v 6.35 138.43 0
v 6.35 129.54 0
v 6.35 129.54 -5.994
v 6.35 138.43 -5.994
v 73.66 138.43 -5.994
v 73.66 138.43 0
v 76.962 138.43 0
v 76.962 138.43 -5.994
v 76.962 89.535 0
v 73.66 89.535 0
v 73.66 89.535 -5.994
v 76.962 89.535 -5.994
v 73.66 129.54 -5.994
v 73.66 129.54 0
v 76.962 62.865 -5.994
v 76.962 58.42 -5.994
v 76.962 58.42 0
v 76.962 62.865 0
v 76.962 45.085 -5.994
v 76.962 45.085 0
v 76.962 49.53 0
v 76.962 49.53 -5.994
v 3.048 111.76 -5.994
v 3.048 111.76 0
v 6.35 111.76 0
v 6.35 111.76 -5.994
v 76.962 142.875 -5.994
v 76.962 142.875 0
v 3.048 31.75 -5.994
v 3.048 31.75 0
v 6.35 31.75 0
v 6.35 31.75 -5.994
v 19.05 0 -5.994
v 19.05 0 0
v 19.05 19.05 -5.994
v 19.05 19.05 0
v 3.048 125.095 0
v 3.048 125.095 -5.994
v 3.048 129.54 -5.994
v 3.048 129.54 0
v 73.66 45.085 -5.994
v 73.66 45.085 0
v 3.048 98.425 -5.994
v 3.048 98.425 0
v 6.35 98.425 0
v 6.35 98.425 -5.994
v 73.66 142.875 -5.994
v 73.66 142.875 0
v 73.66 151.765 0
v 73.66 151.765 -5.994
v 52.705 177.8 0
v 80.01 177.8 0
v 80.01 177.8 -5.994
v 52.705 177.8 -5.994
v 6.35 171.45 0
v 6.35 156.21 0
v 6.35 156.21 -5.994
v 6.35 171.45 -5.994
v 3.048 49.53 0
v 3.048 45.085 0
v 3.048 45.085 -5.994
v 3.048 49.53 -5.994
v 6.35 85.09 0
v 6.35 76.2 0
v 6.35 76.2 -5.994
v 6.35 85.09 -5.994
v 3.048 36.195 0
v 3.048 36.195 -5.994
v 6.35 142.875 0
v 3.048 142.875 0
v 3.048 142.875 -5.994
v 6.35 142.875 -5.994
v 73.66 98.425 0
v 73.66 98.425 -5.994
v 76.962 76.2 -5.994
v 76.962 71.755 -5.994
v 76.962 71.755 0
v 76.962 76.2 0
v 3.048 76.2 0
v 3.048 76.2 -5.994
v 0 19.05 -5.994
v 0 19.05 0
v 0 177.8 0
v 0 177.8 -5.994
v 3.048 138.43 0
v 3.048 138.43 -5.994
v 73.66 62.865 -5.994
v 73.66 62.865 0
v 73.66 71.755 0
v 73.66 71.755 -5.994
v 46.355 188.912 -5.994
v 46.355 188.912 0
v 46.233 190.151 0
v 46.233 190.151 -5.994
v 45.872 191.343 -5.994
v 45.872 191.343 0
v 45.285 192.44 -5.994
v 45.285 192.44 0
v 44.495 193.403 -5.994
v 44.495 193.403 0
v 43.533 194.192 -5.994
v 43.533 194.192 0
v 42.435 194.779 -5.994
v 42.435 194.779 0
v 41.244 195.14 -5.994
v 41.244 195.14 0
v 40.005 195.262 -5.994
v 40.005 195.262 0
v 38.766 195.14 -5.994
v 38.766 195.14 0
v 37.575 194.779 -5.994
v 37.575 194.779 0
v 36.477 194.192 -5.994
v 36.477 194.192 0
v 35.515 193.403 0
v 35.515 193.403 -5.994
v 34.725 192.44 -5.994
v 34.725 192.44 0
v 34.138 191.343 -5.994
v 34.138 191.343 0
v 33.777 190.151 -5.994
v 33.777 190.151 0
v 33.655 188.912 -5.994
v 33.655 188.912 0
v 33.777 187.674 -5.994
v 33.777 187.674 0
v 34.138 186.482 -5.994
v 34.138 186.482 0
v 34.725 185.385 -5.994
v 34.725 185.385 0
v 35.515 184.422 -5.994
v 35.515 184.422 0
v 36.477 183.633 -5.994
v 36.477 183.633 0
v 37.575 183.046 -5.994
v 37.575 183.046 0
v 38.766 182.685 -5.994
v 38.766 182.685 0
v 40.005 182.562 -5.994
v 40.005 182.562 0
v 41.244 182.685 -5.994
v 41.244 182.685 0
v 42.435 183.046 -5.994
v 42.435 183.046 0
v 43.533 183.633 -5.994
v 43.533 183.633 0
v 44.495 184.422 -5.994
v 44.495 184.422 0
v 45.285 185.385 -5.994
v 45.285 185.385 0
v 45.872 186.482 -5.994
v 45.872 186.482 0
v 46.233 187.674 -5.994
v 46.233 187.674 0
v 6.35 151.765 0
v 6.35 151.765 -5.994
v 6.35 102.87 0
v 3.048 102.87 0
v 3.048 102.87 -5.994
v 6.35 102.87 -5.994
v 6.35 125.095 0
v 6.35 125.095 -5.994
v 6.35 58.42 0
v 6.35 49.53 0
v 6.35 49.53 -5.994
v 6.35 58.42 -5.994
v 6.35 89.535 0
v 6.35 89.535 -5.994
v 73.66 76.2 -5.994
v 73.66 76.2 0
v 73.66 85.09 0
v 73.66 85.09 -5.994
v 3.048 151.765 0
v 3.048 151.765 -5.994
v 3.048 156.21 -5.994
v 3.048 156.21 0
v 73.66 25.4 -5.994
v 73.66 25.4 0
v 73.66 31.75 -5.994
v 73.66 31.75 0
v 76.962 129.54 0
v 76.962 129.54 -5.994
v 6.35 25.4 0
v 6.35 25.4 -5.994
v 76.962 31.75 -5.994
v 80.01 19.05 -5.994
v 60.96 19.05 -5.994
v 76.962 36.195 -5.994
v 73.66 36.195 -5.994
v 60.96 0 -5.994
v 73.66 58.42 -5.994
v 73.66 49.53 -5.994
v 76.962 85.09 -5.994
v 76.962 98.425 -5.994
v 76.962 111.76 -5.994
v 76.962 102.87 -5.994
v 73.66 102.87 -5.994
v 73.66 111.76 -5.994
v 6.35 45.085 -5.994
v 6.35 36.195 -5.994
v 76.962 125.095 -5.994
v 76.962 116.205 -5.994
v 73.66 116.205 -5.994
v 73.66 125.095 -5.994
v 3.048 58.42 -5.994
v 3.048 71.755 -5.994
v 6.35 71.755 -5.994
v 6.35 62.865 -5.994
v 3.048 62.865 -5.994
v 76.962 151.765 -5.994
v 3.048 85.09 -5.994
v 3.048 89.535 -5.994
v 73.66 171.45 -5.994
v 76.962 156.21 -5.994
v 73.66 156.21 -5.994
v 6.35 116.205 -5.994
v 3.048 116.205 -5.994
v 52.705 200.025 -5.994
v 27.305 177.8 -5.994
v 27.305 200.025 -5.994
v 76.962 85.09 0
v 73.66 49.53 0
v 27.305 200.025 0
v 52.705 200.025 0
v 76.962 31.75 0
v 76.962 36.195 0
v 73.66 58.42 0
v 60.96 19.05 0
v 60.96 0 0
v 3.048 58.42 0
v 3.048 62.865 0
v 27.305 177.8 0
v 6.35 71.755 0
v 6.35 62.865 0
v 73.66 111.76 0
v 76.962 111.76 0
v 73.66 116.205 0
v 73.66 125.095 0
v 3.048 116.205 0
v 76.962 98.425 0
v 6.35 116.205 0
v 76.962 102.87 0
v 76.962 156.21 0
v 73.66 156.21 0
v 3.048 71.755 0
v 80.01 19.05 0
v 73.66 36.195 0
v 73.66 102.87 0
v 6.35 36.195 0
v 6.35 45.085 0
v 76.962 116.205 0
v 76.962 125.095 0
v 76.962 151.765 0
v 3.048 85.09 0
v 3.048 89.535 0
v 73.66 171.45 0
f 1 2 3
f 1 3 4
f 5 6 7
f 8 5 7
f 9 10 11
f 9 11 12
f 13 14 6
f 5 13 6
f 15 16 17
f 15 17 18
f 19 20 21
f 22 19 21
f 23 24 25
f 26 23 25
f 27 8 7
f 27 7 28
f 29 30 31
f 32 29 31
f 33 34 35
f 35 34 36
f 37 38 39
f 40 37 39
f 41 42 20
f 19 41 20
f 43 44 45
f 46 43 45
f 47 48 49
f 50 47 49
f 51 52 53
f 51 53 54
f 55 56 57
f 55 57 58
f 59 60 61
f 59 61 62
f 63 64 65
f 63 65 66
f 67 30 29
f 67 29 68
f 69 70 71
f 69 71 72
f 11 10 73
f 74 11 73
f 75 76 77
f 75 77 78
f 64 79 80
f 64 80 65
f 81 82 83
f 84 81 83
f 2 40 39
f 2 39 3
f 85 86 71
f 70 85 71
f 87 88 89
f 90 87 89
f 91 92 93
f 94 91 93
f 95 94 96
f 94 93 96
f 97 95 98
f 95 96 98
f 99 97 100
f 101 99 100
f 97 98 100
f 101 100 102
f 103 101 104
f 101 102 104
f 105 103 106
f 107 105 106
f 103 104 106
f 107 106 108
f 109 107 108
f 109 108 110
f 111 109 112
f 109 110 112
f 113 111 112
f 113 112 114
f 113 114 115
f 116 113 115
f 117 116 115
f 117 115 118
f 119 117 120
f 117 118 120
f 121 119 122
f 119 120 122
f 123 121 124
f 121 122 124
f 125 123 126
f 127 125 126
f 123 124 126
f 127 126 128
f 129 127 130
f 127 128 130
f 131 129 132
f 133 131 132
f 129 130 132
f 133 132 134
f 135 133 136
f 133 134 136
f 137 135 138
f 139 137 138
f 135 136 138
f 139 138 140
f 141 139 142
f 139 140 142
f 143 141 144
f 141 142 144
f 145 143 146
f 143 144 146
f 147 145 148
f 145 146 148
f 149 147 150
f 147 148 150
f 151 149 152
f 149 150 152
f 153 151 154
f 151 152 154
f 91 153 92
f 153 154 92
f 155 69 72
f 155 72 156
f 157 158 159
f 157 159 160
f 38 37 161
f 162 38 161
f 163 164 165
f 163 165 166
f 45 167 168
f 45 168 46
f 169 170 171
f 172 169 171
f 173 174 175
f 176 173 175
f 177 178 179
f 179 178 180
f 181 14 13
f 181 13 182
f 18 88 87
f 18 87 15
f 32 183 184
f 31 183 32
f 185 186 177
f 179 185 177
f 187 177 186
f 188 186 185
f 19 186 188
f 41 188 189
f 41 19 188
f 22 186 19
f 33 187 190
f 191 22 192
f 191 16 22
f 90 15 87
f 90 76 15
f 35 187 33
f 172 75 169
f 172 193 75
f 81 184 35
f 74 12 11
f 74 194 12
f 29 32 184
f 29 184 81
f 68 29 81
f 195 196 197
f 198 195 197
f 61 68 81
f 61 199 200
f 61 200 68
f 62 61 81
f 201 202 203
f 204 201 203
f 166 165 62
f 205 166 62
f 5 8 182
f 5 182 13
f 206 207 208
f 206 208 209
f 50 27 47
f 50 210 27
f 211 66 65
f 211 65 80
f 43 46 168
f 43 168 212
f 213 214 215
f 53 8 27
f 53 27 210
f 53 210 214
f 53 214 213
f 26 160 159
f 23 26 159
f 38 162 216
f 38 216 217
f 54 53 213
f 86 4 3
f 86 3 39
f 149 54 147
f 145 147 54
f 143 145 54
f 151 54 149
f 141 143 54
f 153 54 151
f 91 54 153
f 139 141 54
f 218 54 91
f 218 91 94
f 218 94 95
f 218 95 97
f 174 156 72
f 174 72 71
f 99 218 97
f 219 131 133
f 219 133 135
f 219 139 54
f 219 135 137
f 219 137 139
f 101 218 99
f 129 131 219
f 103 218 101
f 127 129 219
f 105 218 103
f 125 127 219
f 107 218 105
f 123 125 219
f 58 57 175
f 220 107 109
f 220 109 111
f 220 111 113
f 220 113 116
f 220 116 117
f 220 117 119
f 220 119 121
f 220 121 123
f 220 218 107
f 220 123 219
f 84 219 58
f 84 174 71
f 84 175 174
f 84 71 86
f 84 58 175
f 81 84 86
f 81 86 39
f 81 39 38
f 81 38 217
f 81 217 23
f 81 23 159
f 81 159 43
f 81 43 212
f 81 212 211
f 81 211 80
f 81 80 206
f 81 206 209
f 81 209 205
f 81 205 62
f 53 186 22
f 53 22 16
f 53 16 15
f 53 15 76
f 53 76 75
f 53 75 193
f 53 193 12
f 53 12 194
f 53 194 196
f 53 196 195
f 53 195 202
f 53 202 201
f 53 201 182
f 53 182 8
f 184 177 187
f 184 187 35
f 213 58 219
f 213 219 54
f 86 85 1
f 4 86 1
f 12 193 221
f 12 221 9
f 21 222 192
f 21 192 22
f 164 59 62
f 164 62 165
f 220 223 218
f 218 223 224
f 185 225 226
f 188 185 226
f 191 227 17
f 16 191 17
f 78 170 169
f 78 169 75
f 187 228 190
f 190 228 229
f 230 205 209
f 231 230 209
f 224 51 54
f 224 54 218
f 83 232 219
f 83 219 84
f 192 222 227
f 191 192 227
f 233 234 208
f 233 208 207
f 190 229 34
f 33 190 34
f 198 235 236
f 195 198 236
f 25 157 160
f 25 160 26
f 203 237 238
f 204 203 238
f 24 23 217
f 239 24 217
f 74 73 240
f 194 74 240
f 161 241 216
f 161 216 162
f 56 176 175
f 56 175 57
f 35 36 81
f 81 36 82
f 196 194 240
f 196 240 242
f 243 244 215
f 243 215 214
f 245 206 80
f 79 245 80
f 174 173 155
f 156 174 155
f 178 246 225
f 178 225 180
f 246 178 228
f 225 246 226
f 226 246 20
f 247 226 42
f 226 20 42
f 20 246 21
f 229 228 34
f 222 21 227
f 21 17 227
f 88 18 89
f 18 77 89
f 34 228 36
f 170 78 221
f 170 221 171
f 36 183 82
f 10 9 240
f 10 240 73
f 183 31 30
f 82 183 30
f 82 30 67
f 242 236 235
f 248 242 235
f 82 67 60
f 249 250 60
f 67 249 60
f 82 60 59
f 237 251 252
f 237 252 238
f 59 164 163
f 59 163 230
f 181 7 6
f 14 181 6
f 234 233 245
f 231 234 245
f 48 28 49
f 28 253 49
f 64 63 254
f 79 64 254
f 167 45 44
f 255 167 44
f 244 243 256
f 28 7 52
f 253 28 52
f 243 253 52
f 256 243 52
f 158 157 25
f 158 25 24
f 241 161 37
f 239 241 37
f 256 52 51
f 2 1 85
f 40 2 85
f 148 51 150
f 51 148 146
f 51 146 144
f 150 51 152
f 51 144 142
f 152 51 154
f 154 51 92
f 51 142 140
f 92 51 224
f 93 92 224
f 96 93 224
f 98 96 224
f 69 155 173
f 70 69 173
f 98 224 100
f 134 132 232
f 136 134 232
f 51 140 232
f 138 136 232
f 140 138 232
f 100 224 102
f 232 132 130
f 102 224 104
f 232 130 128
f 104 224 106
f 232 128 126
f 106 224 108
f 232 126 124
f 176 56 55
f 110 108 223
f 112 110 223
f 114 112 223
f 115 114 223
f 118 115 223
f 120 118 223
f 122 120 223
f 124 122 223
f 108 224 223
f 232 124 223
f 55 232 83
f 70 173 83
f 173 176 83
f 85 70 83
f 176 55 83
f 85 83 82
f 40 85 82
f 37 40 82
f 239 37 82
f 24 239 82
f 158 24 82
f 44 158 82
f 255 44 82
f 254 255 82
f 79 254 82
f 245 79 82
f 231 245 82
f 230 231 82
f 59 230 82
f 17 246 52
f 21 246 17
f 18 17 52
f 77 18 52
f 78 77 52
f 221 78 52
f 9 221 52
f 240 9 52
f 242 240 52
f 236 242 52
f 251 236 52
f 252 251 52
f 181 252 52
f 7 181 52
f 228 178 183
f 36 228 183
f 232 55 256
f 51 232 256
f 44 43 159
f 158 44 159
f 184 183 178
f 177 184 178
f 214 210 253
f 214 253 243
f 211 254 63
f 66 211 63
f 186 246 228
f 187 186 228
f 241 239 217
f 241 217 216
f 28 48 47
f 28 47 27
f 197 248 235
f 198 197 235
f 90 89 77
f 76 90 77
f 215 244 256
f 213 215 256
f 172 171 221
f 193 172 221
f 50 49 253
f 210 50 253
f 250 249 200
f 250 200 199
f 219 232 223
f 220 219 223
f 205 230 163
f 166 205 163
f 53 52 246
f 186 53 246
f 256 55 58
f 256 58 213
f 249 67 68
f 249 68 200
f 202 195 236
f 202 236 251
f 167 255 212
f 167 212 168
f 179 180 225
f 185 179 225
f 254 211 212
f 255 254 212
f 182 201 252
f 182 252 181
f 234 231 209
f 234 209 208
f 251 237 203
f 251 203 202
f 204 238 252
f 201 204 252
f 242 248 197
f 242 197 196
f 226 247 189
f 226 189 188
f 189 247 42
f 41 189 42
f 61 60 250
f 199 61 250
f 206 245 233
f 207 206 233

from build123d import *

# Parameters (mm, degrees)
SKETCH1_W           = 67.31
SKETCH1_H           = 146.05
BOSS_EXTRUDE1_DEPTH = 5.9944
SKETCH2_W           = 6.604
SKETCH2_H           = 4.445
CUT_EXTRUDE1_DEPTH  = 6.9944
SKETCH3_W           = 25.4
SKETCH3_H           = 22.225
SKETCH3_R           = 6.35
BOSS_EXTRUDE2_DEPTH = 5.9944


with BuildPart() as part:
    # Sketch1 → Boss-Extrude1 (new body)
    with BuildSketch(Plane.XY):
        Polygon((0, 19.05), (0, 177.8), (6.35, 177.8), (73.66, 177.8), (80.01, 177.8), (80.01, 19.05), (60.96, 19.05), (60.96, 0), (19.05, 0), (19.05, 19.05), align=None)
        with Locations((40.005, 98.425)):
            Rectangle(SKETCH1_W, SKETCH1_H, mode=Mode.SUBTRACT)
    extrude(amount=-BOSS_EXTRUDE1_DEPTH)

    # Sketch2 → Cut-Extrude1 (cut, through all)
    with BuildSketch(Plane.XY):
        with Locations((6.35, 33.9725)):
            Rectangle(SKETCH2_W, SKETCH2_H)
        with Locations((6.35, 47.3075)):
            Rectangle(SKETCH2_W, SKETCH2_H)
        with Locations((6.35, 60.6425)):
            Rectangle(SKETCH2_W, SKETCH2_H)
        with Locations((6.35, 73.9775)):
            Rectangle(SKETCH2_W, SKETCH2_H)
        with Locations((6.35, 87.3125)):
            Rectangle(SKETCH2_W, SKETCH2_H)
        with Locations((6.35, 100.6475)):
            Rectangle(SKETCH2_W, SKETCH2_H)
        with Locations((6.35, 113.9825)):
            Rectangle(SKETCH2_W, SKETCH2_H)
        with Locations((6.35, 127.3175)):
            Rectangle(SKETCH2_W, SKETCH2_H)
        with Locations((6.35, 140.6525)):
            Rectangle(SKETCH2_W, SKETCH2_H)
        with Locations((6.35, 153.9875)):
            Rectangle(SKETCH2_W, SKETCH2_H)
        with Locations((73.66, 153.9875)):
            Rectangle(SKETCH2_W, SKETCH2_H)
        with Locations((73.66, 140.6525)):
            Rectangle(SKETCH2_W, SKETCH2_H)
        with Locations((73.66, 127.3175)):
            Rectangle(SKETCH2_W, SKETCH2_H)
        with Locations((73.66, 113.9825)):
            Rectangle(SKETCH2_W, SKETCH2_H)
        with Locations((73.66, 100.6475)):
            Rectangle(SKETCH2_W, SKETCH2_H)
        with Locations((73.66, 87.3125)):
            Rectangle(SKETCH2_W, SKETCH2_H)
        with Locations((73.66, 73.9775)):
            Rectangle(SKETCH2_W, SKETCH2_H)
        with Locations((73.66, 60.6425)):
            Rectangle(SKETCH2_W, SKETCH2_H)
        with Locations((73.66, 47.3075)):
            Rectangle(SKETCH2_W, SKETCH2_H)
        with Locations((73.66, 33.9725)):
            Rectangle(SKETCH2_W, SKETCH2_H)
    extrude(amount=-CUT_EXTRUDE1_DEPTH, mode=Mode.SUBTRACT)

    # Sketch3 → Boss-Extrude2 (add)
    with BuildSketch(Plane.XY):
        with Locations((40.005, 188.9125)):
            Rectangle(SKETCH3_W, SKETCH3_H)
        with Locations((40.005, 188.9125)):
            Circle(SKETCH3_R, mode=Mode.SUBTRACT)
    extrude(amount=-BOSS_EXTRUDE2_DEPTH)


solid = part.part
